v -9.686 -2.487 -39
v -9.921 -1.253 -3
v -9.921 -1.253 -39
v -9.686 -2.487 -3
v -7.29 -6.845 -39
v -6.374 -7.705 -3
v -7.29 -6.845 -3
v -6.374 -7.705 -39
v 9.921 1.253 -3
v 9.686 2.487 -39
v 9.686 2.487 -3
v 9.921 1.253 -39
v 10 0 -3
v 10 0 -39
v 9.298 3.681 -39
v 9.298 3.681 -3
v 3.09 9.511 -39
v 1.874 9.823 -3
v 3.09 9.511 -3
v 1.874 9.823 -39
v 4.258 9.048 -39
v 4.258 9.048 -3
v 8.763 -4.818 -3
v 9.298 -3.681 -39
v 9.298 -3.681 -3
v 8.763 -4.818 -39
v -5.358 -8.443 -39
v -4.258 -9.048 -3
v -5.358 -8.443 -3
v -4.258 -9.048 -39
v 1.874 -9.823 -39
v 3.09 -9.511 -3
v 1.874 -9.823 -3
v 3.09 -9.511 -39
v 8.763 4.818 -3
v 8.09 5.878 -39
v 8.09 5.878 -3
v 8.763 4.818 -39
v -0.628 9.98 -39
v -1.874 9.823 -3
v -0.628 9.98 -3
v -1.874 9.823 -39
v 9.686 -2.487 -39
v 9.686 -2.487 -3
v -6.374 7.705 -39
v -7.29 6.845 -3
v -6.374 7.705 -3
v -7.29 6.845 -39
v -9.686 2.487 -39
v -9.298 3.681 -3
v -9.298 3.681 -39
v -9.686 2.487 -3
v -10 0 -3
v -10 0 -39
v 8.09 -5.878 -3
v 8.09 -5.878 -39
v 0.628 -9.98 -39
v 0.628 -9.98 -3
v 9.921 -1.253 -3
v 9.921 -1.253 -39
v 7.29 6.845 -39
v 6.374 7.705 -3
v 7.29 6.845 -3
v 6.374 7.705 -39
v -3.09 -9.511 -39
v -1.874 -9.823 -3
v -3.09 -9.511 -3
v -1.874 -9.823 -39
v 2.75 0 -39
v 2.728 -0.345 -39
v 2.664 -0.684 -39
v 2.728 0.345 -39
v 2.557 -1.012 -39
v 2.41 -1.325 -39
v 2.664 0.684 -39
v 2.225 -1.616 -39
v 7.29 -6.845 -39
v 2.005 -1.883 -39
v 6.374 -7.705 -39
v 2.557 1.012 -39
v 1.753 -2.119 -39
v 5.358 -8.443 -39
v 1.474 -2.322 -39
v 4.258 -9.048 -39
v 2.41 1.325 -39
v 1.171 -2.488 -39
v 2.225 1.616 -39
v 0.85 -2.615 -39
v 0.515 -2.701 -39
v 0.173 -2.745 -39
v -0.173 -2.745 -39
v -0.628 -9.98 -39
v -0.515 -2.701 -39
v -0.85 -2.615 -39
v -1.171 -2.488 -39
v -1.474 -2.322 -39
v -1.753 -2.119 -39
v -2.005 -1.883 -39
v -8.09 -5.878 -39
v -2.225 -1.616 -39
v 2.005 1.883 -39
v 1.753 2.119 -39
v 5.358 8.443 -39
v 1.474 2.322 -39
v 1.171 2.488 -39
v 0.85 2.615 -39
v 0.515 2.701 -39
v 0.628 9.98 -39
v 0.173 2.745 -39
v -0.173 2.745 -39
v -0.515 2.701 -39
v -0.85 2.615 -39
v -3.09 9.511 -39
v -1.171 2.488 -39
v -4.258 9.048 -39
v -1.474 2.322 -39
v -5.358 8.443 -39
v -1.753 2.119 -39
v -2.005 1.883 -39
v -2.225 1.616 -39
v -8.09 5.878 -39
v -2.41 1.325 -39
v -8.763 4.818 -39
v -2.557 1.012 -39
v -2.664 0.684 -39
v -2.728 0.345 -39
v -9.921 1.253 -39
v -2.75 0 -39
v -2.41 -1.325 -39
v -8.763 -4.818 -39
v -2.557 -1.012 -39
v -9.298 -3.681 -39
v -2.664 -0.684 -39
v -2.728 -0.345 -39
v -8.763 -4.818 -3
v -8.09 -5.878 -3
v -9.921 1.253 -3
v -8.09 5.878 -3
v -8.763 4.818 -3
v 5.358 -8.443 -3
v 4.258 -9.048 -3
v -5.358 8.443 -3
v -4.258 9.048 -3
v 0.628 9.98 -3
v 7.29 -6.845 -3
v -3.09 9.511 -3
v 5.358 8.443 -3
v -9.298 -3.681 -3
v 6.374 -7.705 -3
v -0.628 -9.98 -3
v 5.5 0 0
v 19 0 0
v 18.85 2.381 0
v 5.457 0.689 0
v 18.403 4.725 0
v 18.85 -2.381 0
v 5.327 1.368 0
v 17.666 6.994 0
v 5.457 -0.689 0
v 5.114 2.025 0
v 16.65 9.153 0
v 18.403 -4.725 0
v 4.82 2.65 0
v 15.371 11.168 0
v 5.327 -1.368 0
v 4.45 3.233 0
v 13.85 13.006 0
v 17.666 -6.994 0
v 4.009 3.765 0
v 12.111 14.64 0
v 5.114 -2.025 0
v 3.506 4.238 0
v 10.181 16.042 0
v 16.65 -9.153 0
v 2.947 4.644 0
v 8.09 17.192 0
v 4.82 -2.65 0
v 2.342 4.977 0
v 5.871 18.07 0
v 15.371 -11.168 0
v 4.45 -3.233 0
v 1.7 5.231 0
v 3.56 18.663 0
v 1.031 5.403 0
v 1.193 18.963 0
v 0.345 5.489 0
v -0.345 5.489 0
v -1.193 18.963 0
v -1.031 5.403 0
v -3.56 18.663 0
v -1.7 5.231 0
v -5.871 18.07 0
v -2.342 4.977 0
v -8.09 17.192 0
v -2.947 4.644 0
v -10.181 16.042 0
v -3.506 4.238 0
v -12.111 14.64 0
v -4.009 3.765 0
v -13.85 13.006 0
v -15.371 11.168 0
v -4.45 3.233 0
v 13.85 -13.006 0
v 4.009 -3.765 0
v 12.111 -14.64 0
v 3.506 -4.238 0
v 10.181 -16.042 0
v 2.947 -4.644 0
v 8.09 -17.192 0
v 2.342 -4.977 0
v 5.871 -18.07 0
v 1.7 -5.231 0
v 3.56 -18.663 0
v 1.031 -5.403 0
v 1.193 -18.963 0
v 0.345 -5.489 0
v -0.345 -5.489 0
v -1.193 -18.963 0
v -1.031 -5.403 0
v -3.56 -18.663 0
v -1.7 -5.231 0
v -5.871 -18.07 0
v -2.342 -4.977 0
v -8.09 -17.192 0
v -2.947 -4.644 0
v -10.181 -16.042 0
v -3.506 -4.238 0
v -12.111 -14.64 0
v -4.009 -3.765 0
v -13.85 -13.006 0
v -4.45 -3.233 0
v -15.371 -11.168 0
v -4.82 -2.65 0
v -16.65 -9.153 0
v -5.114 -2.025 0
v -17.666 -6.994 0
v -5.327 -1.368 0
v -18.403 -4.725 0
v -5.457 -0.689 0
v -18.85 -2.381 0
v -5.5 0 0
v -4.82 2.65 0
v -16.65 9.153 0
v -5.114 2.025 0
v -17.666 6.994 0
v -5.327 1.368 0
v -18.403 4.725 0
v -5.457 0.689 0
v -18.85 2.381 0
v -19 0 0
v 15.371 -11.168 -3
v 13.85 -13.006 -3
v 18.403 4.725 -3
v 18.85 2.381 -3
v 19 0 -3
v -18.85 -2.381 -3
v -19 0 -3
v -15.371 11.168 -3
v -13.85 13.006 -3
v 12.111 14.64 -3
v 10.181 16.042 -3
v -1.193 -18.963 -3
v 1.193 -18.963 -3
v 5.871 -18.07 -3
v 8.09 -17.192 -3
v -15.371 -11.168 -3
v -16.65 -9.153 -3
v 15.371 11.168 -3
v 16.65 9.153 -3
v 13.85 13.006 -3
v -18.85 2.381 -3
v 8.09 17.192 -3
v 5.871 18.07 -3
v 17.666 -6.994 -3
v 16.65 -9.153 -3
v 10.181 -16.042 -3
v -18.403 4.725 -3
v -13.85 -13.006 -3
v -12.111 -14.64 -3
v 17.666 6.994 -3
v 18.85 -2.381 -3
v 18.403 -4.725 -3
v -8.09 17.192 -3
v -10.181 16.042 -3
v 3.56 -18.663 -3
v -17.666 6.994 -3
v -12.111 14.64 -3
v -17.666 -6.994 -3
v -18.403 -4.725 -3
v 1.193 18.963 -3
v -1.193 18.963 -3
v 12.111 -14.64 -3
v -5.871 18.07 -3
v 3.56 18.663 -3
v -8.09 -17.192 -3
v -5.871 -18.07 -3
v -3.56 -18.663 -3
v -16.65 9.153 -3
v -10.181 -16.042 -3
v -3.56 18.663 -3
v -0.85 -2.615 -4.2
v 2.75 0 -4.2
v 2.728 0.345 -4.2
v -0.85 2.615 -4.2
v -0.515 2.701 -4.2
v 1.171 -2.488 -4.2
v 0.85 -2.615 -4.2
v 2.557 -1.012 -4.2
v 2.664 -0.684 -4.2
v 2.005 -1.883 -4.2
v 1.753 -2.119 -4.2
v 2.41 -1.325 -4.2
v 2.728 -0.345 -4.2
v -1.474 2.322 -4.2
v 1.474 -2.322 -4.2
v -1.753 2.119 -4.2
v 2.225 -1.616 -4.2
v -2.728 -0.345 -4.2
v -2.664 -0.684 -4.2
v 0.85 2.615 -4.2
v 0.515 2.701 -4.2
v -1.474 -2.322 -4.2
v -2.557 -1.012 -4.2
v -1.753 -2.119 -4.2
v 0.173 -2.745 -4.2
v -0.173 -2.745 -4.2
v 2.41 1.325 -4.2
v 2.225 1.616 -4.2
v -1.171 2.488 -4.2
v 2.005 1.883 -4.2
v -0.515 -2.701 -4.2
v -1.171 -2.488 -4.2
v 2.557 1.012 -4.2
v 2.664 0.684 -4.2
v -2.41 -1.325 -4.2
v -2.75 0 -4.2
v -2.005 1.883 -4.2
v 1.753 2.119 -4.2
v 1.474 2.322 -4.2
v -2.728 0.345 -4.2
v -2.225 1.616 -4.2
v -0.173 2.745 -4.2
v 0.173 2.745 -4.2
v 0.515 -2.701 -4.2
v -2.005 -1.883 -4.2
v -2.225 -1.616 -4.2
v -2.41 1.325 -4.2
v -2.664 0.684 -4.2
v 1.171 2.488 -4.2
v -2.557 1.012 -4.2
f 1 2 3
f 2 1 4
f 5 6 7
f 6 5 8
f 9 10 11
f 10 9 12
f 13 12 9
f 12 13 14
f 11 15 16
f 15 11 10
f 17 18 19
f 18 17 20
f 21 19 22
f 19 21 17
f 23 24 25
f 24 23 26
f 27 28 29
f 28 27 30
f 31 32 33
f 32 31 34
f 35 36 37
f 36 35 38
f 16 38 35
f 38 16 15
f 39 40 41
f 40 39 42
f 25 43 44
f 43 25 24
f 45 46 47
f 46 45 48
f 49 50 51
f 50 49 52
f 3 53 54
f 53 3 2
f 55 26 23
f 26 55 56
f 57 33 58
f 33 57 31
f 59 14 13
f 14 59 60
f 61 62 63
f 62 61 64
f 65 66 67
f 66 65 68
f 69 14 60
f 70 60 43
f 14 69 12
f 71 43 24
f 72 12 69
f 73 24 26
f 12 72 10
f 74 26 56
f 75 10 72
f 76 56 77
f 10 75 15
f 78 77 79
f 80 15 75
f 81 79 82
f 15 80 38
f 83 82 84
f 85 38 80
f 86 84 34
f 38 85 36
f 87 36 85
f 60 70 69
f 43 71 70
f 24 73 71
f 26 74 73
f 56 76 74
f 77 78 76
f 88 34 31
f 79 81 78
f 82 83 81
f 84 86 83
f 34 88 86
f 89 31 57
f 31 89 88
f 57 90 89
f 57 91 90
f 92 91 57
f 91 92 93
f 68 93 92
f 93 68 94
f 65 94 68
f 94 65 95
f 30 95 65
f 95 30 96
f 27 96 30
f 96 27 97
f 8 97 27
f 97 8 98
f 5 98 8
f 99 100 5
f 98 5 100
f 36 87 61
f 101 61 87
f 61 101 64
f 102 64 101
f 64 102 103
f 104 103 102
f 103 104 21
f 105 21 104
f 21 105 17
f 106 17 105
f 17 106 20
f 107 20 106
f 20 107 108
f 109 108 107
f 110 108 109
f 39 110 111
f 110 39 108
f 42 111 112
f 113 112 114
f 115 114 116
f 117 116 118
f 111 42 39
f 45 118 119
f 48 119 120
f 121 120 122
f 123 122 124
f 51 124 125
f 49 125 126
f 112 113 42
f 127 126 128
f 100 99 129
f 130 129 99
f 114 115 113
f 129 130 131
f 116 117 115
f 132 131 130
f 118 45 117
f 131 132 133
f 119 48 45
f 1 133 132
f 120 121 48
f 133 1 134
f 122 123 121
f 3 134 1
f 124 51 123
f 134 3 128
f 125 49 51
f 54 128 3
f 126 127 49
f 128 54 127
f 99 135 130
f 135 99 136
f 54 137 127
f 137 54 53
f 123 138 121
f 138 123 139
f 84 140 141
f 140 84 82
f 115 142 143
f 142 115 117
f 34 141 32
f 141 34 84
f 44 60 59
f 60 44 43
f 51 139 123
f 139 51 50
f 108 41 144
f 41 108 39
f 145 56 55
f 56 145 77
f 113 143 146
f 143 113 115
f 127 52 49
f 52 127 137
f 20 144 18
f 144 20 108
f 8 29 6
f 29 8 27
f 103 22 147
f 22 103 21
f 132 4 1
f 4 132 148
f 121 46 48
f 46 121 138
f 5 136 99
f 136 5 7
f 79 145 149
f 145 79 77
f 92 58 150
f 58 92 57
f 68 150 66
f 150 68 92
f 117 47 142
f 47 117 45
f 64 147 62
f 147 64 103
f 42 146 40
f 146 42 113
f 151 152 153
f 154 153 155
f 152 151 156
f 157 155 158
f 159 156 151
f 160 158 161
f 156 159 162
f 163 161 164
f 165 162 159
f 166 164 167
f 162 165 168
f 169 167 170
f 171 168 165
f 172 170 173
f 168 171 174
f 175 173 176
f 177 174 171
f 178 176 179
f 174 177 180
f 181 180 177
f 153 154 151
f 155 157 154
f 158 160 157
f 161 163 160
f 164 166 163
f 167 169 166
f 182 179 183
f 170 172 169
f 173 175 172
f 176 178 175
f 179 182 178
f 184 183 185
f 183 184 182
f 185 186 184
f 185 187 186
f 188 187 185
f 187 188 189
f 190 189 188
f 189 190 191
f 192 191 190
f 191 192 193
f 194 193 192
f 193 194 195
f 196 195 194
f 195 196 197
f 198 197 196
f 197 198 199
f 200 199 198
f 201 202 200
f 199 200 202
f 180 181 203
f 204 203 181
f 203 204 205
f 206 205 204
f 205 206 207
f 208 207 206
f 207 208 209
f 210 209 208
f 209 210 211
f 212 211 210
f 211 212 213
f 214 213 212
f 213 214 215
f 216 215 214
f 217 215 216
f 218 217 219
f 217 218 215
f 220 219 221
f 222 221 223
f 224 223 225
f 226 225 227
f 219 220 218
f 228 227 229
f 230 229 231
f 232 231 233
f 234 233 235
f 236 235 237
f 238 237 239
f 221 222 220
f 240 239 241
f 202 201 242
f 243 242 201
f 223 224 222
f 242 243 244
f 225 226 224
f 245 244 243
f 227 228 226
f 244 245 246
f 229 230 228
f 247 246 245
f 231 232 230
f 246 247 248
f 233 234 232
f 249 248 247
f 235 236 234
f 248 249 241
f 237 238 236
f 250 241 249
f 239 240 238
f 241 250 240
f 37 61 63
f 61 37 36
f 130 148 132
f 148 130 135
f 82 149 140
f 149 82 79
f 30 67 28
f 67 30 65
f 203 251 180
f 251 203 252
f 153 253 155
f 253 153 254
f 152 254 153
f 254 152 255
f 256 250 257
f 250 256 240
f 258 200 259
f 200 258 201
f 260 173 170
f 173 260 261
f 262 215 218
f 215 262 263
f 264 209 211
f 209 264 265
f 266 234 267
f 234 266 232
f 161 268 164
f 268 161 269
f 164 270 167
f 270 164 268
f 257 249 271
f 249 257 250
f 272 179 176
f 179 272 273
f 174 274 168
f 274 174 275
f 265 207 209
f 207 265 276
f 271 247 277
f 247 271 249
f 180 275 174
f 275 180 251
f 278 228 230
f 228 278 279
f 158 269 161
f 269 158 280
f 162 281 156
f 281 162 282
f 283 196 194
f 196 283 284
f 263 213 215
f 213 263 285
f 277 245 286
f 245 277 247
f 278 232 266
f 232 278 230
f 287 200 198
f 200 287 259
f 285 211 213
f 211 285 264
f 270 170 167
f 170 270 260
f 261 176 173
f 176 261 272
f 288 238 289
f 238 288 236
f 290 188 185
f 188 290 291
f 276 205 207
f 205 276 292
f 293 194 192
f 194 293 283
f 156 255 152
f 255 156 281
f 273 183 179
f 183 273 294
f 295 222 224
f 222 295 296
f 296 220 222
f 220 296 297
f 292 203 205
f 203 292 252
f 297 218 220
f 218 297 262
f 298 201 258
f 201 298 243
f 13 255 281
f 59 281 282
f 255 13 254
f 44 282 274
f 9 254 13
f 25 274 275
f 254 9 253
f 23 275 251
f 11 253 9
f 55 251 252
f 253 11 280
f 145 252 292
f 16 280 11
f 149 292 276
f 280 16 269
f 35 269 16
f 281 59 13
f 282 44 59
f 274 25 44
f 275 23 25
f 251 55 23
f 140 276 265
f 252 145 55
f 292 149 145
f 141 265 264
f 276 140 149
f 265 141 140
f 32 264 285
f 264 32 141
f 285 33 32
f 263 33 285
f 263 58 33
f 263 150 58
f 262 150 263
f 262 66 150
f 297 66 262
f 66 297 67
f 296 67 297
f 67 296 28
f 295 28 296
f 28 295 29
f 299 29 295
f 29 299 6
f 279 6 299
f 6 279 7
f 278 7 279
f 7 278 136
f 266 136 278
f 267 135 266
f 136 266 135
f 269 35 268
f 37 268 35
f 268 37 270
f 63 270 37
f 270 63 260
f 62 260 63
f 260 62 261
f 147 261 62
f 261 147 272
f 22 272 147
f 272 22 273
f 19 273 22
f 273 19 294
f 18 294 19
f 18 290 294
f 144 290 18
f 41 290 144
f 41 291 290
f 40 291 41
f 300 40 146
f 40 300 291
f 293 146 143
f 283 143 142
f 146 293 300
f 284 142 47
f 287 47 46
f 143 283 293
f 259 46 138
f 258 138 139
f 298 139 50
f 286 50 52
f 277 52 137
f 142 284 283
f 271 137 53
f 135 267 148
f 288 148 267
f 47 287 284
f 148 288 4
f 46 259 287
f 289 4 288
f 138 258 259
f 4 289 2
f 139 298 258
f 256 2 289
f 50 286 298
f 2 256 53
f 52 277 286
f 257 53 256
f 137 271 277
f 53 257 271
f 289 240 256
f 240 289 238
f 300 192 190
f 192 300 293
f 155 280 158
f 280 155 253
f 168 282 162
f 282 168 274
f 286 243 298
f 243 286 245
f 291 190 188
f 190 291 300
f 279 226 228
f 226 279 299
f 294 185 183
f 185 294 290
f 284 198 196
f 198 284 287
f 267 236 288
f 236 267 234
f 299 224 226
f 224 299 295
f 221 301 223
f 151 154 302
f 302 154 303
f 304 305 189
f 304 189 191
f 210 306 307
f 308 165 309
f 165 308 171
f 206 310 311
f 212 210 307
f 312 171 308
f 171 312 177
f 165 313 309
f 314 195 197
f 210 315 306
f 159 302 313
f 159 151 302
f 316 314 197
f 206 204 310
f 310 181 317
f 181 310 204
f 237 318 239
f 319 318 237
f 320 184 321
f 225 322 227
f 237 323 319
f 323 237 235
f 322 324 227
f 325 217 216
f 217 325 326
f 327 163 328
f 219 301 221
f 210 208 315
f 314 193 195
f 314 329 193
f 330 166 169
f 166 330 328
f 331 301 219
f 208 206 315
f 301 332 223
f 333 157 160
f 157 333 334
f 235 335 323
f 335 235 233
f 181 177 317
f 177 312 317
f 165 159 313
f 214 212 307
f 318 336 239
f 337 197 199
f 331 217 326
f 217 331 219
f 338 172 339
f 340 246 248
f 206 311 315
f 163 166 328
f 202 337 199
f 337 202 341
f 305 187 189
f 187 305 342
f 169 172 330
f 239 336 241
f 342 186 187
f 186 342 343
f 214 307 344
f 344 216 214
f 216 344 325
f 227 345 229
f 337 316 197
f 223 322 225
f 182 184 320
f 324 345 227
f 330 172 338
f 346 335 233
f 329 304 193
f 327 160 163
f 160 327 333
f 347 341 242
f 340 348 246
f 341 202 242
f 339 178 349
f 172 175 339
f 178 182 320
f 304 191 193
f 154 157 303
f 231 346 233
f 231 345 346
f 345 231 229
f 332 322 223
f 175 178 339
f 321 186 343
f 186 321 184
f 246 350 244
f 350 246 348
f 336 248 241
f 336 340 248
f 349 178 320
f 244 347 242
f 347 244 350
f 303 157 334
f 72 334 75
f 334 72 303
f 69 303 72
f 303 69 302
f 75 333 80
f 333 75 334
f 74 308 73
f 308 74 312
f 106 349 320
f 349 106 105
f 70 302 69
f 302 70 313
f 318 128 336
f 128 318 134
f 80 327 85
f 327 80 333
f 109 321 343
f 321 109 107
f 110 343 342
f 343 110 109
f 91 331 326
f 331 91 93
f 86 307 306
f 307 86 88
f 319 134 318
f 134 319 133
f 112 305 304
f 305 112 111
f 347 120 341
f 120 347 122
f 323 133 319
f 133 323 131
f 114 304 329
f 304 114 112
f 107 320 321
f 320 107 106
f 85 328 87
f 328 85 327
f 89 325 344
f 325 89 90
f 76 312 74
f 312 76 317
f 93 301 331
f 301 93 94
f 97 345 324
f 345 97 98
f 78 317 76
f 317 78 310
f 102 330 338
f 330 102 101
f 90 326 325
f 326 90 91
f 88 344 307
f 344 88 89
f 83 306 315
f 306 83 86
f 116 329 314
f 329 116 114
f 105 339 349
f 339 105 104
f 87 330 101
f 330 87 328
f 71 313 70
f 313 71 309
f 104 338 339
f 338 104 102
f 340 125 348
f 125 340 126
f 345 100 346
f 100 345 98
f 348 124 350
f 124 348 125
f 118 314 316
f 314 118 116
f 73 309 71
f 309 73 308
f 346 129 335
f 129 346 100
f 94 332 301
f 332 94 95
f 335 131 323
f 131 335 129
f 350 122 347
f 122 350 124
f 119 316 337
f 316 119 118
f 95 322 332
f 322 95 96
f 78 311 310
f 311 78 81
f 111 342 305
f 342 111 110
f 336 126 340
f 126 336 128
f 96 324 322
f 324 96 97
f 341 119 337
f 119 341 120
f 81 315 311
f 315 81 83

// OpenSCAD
$fn = 50;


difference() {
	union() {
		translate(v = [0, 0, -39.0000000000]) {
			cylinder(h = 39, r = 10.0000000000);
		}
		translate(v = [0, 0, -3.0000000000]) {
			cylinder(h = 3, r = 19.0000000000);
		}
	}
	union() {
		translate(v = [0, 0, 0]) {
			rotate(a = [0, 0, 0]) {
				difference() {
					union() {
						#translate(v = [0, 0, -39.0000000000]) {
							cylinder(h = 39, r = 2.2500000000);
						}
						#translate(v = [0, 0, -4.2000000000]) {
							cylinder(h = 4.2000000000, r1 = 2.7500000000, r2 = 5.5000000000);
						}
						#translate(v = [0, 0, -39.0000000000]) {
							cylinder(h = 39, r = 2.7500000000);
						}
						#translate(v = [0, 0, -39.0000000000]) {
							cylinder(h = 39, r = 2.2500000000);
						}
					}
					union();
				}
			}
		}
	}
}
